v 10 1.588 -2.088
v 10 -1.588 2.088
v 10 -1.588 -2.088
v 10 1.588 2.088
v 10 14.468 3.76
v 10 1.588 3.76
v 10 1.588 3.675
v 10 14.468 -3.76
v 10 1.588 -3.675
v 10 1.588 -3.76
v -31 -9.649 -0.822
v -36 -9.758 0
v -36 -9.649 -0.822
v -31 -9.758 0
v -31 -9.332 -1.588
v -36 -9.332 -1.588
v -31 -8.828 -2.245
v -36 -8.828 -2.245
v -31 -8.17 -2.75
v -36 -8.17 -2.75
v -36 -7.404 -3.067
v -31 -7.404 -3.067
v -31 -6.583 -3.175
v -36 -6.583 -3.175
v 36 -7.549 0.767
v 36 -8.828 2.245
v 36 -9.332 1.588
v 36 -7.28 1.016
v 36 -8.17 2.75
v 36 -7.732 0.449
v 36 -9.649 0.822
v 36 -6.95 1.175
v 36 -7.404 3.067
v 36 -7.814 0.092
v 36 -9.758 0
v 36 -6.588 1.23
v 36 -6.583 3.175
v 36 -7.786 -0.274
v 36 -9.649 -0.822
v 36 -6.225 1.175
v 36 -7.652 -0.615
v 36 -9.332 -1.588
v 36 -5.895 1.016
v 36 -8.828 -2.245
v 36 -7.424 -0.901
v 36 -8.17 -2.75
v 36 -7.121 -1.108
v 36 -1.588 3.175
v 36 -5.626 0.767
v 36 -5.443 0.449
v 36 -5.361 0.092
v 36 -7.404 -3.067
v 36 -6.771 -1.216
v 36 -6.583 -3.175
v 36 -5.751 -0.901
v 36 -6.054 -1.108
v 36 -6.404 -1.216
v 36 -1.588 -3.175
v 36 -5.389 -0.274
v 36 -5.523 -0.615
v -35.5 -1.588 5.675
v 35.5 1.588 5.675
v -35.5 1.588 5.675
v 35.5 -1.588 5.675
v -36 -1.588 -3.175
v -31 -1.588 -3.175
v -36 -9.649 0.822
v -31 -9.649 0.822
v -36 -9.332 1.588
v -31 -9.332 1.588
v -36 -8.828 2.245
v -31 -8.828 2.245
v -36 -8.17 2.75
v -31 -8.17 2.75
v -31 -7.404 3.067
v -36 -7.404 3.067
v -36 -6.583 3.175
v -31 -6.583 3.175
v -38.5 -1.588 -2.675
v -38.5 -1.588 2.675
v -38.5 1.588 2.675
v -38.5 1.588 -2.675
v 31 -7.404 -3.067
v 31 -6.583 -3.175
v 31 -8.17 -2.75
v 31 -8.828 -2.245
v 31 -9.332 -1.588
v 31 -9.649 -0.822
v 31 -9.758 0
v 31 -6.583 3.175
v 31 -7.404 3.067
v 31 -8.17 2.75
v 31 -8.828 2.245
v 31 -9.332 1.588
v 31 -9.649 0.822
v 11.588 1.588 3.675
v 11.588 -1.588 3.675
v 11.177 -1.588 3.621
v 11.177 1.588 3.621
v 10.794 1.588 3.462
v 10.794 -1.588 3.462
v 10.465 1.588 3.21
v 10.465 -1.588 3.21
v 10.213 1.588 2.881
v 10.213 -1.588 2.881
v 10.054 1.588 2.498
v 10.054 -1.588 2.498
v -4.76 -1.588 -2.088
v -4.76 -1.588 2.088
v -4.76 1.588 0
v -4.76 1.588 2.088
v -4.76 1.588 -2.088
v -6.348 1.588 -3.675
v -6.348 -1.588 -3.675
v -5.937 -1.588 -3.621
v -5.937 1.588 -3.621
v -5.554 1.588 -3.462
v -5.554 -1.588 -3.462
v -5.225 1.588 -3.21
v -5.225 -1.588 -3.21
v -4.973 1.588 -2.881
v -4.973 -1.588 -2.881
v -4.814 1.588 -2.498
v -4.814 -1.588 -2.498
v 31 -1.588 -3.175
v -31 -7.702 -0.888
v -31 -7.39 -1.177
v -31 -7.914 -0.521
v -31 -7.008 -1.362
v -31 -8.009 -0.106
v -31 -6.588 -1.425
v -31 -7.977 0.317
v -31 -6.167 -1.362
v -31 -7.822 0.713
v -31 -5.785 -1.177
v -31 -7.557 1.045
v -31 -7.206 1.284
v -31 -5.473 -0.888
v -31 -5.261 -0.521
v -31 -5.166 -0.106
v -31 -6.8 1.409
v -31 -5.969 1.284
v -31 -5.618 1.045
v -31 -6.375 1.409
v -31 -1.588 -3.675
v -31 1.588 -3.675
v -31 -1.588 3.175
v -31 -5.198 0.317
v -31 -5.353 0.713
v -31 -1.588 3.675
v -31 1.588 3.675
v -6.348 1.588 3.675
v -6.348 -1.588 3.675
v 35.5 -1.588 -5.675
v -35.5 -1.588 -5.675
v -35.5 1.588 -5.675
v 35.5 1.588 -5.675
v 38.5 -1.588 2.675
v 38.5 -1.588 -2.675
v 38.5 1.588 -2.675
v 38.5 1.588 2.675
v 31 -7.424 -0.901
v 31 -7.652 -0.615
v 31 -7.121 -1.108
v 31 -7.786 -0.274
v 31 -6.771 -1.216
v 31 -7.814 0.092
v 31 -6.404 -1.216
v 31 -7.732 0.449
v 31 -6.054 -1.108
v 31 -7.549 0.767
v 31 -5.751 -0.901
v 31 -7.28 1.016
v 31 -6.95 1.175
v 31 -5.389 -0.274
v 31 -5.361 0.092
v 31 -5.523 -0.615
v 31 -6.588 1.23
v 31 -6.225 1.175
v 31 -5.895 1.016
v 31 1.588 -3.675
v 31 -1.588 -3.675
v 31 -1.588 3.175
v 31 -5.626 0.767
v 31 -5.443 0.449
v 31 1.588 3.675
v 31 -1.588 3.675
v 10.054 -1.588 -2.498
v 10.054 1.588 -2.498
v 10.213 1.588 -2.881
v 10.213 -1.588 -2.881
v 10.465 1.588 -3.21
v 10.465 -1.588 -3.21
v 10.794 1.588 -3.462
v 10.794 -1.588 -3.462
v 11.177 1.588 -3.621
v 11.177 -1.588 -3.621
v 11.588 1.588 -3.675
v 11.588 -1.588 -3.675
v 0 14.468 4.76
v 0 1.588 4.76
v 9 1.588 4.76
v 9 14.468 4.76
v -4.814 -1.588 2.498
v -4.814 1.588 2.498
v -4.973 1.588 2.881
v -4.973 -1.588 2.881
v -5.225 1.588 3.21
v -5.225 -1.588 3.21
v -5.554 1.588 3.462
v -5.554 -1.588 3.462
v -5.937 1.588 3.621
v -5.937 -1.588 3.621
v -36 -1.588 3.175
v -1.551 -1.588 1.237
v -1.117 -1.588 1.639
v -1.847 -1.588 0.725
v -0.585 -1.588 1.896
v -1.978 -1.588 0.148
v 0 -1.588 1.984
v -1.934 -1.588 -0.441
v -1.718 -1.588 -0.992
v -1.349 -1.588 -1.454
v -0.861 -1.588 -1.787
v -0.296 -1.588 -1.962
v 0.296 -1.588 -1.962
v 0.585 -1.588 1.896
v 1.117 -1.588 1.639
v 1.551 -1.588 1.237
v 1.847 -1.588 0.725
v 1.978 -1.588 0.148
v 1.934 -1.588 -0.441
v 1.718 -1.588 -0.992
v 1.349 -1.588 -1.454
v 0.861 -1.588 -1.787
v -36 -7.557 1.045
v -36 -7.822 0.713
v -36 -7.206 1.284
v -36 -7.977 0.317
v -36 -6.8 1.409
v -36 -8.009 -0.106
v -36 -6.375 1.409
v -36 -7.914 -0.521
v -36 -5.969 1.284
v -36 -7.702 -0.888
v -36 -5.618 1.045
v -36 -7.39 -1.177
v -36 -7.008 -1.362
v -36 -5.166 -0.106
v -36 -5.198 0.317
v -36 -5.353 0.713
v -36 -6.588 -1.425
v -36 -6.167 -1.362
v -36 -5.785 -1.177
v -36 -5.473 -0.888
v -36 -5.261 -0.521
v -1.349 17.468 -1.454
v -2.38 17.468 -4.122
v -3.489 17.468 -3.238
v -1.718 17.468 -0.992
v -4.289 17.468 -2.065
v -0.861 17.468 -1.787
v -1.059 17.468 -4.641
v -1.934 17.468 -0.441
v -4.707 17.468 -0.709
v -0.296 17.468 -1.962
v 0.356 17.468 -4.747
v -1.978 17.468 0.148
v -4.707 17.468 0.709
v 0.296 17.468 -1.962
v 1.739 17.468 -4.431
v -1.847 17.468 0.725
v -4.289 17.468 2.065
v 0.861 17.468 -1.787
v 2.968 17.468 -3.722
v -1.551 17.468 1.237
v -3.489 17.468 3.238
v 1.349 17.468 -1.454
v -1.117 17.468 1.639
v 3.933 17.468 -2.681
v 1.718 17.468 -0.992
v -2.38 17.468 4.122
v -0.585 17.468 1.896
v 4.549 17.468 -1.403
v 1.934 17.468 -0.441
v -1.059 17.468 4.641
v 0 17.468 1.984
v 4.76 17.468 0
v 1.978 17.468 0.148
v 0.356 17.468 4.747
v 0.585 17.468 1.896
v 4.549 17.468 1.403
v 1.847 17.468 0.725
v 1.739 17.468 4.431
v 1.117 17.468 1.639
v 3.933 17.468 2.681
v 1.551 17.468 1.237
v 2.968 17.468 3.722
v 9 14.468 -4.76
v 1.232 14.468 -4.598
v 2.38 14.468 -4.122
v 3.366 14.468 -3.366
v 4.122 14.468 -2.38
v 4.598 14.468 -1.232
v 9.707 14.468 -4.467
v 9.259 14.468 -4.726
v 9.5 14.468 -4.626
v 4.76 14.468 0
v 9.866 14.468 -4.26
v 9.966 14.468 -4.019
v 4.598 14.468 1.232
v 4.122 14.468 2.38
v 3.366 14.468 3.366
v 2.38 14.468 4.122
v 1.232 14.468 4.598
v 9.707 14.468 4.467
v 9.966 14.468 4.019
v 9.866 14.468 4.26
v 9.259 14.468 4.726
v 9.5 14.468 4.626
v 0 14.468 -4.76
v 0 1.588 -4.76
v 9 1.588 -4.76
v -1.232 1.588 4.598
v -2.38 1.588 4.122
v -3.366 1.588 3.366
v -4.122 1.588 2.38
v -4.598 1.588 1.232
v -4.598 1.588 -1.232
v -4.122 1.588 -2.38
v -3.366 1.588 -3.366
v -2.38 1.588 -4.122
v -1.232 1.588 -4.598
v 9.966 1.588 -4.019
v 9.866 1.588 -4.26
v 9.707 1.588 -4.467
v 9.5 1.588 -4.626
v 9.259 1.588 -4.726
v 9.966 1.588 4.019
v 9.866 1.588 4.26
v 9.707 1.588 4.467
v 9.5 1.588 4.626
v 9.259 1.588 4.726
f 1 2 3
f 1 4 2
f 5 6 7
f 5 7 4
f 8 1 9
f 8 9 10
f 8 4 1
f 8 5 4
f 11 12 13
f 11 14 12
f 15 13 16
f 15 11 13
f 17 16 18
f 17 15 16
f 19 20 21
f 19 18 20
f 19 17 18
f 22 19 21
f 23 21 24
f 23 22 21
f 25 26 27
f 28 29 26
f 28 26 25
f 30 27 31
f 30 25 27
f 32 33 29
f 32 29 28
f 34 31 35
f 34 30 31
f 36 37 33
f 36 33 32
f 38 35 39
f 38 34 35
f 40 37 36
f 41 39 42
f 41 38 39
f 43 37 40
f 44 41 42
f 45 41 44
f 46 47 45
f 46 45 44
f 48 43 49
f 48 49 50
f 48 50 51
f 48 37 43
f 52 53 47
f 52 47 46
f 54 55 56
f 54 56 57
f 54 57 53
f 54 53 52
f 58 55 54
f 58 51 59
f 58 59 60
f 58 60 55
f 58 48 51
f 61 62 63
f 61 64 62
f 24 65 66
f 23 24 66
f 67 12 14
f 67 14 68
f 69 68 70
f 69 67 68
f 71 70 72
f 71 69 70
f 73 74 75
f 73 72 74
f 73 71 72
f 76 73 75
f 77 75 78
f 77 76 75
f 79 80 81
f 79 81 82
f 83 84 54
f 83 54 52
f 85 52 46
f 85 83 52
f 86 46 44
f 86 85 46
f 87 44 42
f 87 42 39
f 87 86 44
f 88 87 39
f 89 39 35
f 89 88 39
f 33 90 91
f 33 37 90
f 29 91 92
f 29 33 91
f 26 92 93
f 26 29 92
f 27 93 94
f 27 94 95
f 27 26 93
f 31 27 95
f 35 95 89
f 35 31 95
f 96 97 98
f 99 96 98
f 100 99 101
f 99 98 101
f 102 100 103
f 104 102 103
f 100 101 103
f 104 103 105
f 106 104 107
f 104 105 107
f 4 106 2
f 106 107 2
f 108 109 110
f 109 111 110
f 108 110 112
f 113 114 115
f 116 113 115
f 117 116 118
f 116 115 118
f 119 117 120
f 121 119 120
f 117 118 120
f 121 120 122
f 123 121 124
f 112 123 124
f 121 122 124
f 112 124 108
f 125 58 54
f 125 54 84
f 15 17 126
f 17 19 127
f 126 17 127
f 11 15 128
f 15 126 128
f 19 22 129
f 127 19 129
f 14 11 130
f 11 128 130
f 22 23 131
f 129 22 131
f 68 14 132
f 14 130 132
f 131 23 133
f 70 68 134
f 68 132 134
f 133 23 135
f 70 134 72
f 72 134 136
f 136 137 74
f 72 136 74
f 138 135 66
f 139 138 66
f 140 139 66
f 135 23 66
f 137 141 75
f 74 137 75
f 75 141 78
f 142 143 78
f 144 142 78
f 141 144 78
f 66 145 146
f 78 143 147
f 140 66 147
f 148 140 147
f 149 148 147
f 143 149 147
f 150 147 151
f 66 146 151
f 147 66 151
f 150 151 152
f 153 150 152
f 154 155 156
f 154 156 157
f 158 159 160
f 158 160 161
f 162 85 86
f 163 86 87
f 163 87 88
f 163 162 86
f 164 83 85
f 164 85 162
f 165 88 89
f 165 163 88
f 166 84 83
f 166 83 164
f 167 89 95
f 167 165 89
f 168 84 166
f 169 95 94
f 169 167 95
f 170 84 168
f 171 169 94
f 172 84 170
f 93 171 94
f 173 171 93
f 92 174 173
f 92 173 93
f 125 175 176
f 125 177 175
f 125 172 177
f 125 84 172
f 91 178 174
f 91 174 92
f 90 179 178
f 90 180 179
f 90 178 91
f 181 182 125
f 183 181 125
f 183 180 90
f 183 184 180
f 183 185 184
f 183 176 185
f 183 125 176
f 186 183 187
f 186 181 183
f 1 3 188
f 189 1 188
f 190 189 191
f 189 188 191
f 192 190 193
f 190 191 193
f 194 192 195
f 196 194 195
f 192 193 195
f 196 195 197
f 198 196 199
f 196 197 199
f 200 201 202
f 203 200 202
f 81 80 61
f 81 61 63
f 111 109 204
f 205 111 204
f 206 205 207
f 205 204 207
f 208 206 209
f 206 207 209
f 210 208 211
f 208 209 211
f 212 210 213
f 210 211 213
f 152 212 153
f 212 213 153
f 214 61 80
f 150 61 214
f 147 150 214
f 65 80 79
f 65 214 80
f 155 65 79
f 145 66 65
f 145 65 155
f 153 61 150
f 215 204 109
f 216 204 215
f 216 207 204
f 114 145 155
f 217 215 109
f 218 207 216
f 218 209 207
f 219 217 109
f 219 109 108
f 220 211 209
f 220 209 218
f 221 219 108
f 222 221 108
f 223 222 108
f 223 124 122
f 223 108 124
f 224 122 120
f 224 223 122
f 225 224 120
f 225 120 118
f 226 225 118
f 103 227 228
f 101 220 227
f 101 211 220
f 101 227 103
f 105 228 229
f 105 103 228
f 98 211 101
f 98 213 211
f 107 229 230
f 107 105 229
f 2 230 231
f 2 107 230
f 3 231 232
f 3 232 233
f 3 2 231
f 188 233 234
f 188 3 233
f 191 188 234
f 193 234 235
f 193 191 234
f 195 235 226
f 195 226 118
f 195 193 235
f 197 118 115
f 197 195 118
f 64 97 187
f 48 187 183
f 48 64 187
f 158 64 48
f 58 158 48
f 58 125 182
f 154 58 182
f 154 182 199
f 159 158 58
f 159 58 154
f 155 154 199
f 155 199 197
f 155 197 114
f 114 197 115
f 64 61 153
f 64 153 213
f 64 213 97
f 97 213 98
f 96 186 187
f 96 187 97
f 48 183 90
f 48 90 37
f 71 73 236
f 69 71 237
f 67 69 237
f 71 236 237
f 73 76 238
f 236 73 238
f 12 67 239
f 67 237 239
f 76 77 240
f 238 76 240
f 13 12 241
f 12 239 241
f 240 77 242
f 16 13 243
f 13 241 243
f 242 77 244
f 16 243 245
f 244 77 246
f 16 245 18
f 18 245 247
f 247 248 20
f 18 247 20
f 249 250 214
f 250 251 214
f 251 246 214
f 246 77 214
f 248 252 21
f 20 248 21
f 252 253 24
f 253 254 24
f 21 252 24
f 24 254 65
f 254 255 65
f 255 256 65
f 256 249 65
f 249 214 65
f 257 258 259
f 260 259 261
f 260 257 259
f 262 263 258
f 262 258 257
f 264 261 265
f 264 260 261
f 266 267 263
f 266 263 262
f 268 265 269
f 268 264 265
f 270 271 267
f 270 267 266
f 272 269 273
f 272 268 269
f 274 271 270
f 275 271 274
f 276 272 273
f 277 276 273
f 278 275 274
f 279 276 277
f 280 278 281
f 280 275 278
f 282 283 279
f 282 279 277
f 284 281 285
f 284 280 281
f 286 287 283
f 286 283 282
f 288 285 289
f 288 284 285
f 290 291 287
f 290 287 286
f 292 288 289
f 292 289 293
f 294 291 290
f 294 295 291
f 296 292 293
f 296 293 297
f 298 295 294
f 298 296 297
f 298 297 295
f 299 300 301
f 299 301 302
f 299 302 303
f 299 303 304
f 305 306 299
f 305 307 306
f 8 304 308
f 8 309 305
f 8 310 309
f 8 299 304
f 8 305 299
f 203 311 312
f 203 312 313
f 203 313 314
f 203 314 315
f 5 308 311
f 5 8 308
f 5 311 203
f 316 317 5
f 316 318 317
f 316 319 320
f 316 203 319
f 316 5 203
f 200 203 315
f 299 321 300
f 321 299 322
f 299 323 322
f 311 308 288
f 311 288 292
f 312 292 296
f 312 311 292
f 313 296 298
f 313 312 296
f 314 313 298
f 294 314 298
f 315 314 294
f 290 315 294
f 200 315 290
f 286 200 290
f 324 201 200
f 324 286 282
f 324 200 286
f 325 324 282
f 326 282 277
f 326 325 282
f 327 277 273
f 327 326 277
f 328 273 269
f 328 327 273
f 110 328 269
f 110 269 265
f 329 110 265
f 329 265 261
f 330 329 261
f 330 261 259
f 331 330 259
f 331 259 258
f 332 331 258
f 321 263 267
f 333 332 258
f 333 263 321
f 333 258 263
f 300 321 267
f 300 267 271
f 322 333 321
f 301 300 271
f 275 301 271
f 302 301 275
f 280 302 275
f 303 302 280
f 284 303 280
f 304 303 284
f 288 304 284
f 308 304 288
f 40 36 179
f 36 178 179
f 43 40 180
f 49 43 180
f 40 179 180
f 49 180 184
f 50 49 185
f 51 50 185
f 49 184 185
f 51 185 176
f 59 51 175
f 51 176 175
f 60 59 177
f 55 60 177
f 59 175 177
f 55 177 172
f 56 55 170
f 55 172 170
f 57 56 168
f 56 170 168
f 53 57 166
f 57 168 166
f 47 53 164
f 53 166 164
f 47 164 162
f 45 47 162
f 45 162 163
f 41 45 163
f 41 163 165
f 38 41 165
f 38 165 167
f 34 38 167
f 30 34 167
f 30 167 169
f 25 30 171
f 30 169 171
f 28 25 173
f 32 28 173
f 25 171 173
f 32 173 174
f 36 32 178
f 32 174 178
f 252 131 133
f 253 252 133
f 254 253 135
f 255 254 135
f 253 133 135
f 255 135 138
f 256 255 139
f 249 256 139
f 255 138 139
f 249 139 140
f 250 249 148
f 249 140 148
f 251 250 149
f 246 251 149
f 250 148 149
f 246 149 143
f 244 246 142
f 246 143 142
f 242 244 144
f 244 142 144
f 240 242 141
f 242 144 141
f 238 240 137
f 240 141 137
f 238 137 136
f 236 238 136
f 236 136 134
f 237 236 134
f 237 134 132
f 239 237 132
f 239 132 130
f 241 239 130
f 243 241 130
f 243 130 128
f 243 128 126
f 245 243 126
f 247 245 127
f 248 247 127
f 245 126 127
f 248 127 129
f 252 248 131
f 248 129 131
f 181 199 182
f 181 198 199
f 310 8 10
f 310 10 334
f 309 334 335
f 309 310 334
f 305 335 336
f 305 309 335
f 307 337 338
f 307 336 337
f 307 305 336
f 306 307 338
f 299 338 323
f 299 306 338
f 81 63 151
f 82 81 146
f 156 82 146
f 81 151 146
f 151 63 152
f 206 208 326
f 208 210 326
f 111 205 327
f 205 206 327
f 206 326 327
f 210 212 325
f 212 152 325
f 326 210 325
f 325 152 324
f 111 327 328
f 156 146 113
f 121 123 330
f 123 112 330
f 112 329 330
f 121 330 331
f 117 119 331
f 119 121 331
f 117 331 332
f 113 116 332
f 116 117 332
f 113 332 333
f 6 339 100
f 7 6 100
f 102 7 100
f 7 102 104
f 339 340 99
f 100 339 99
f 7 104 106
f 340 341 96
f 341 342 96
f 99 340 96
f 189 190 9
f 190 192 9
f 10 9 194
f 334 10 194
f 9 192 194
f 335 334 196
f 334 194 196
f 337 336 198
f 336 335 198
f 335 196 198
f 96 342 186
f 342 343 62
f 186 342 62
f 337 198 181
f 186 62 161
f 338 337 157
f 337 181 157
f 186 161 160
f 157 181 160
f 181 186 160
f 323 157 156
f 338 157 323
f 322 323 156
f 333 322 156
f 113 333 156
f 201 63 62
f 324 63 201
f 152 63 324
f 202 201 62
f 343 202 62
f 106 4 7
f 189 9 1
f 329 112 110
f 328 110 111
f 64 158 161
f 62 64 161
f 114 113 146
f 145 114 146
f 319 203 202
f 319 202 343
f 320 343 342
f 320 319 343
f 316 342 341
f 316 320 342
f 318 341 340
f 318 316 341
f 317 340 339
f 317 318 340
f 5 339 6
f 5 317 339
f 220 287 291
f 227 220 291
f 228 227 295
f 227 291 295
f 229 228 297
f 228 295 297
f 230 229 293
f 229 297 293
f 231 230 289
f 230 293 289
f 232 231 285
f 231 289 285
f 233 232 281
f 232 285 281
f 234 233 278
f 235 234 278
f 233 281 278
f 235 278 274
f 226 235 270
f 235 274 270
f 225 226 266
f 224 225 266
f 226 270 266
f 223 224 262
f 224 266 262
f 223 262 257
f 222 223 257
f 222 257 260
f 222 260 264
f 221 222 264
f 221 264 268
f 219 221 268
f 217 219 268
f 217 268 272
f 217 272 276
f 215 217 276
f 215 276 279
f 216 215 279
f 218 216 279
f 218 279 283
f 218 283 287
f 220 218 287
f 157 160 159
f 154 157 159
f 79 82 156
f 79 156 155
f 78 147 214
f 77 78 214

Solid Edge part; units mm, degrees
sketch "Sketch1" plane through (0, 0, 0) normal (0, -1, 0) x (1, 0, 0)
  line L0 (-41, -7.5) -> (41, -7.5)
  line L1 (41, -7.5) -> (41, 7.5)
  line L2 (41, 7.5) -> (-41, 7.5)
  line L3 (-41, 7.5) -> (-41, -7.5)
  dimension "D1" = 82
  dimension "D2" = 15
extrude "Protrusion1" add sketch "Sketch1" along normal mid plane 3.175
sketch "Sketch2" plane through (0, -1.5875, 0) normal (0, -1, 0) x (1, 0, 0)
  line L0 (-36, -3.175) -> (-31, -3.175)
  line L1 (-31, -3.175) -> (-31, 3.175)
  line L2 (-31, 3.175) -> (-36, 3.175)
  line L3 (-36, 3.175) -> (-36, -3.175)
  line L4 (36, -3.175) -> (31, -3.175)
  line L5 (31, -3.175) -> (31, 3.175)
  line L6 (31, 3.175) -> (36, 3.175)
  line L7 (36, 3.175) -> (36, -3.175)
  dimension "D1" = 5
  dimension "D2" = 6.35
  dimension "D3" = 31
extrude "ExtrudedProtrusion_2" add sketch "Sketch2" along normal blind 8.17
extrude "Cutout1" [suppressed]
hole "Hole_1" at (0, -6.5875, 0) direction (-1, 0, 0) diameter 2.85 end through all thread major 3.5 thread length 2
hole "Hole_2" at (0, -6.5875, 0) direction (1, 0, 0) diameter 2.459 end through all thread major 3 thread length 2
sketch "Sketch3" plane through (0, 1.5875, 0) normal (0, 1, 0) x (1, 0, 0)
  circle A0 centre (0, 0) radius 4.76
extrude "ExtrudedProtrusion_3" add sketch "Sketch3" along normal blind 15.88
sketch "Sketch4" plane through (0, 1.5875, 0) normal (0, 1, 0) x (1, 0, 0)
  line L0 (10, 4.76) -> (0, 4.76)
  line L1 (0, 4.76) -> (0, -4.76)
  line L2 (0, -4.76) -> (10, -4.76)
  line L3 (10, -4.76) -> (10, 4.76)
  dimension "D1" = 10
  dimension "D2" = 9.52
  dimension "D3" = 4.76
extrude "ExtrudedProtrusion_4" add sketch "Sketch4" along normal blind 12.88
fillet "Round_1" radius 1 2 edges at (10, 8.0275, -4.76) (10, 8.0275, 4.76)
hole "Hole_3" at (0, 17.4675, 0) direction (0, -1, 0) diameter 3.9675 end through all thread major 4.826 thread length 2
chamfer "Chamfer_1" distance 3 angle 45 4 edges at (41, 0, 7.5) (41, 0, -7.5) (-41, 0, 7.5) (-41, 0, -7.5)
fillet "Round_2" radius 3.175 4 edges at (-33.5, -9.7575, -3.175) (-33.5, -9.7575, 3.175) (33.5, -9.7575, 3.175) (33.5, -9.7575, -3.175)
sketch "Sketch5" plane through (0, -1.5875, 0) normal (0, -1, 0) x (1, 0, 0)
  line L0 (-38.5, -5.675) -> (38.5, -5.675)
  line L1 (38.5, -5.675) -> (38.5, 5.675)
  line L2 (38.5, 5.675) -> (-38.5, 5.675)
  line L3 (-38.5, 5.675) -> (-38.5, -5.675)
  line L4 (43.8094, 8.6849) -> (-43.8094, 8.6849)
  line L5 (-43.8094, 8.6849) -> (-43.8094, -8.6849)
  line L6 (-43.8094, -8.6849) -> (43.8094, -8.6849)
  line L7 (43.8094, -8.6849) -> (43.8094, 8.6849)
extrude "Cutout2" cut sketch "Sketch5" against normal up to surface (3.175 mm away)
sketch "Sketch6" plane through (0, 1.5875, 0) normal (0, 1, 0) x (-1, 0, 0)
  line L0 (31, 3.675) -> (4.76, 3.675)
  line L1 (4.76, 3.675) -> (4.76, -3.675)
  line L2 (4.76, -3.675) -> (31, -3.675)
  line L3 (31, -3.675) -> (31, 3.675)
  line L4 (-31, 3.675) -> (-10, 3.675)
  line L5 (-10, 3.675) -> (-10, -3.675)
  line L6 (-10, -3.675) -> (-31, -3.675)
  line L7 (-31, -3.675) -> (-31, 3.675)
  dimension "D1" = 2
  dimension "D2" = 2
  dimension "D3" = 2
  dimension "D4" = 2
extrude "Cutout3" cut sketch "Sketch6" against normal up to surface (3.175 mm away)
fillet "Round_5" radius 1.5875 4 edges at (10, 0, -3.675) (10, 0, 3.675) (-4.76, 0, -3.675) (-4.76, 0, 3.675)
chamfer "Chamfer_2" distance 3 angle 45 4 edges at (38.5, 0, -5.675) (38.5, 0, 5.675) (-38.5, 0, 5.675) (-38.5, 0, -5.675)
properties material "Aluminium, 6061-T6"
